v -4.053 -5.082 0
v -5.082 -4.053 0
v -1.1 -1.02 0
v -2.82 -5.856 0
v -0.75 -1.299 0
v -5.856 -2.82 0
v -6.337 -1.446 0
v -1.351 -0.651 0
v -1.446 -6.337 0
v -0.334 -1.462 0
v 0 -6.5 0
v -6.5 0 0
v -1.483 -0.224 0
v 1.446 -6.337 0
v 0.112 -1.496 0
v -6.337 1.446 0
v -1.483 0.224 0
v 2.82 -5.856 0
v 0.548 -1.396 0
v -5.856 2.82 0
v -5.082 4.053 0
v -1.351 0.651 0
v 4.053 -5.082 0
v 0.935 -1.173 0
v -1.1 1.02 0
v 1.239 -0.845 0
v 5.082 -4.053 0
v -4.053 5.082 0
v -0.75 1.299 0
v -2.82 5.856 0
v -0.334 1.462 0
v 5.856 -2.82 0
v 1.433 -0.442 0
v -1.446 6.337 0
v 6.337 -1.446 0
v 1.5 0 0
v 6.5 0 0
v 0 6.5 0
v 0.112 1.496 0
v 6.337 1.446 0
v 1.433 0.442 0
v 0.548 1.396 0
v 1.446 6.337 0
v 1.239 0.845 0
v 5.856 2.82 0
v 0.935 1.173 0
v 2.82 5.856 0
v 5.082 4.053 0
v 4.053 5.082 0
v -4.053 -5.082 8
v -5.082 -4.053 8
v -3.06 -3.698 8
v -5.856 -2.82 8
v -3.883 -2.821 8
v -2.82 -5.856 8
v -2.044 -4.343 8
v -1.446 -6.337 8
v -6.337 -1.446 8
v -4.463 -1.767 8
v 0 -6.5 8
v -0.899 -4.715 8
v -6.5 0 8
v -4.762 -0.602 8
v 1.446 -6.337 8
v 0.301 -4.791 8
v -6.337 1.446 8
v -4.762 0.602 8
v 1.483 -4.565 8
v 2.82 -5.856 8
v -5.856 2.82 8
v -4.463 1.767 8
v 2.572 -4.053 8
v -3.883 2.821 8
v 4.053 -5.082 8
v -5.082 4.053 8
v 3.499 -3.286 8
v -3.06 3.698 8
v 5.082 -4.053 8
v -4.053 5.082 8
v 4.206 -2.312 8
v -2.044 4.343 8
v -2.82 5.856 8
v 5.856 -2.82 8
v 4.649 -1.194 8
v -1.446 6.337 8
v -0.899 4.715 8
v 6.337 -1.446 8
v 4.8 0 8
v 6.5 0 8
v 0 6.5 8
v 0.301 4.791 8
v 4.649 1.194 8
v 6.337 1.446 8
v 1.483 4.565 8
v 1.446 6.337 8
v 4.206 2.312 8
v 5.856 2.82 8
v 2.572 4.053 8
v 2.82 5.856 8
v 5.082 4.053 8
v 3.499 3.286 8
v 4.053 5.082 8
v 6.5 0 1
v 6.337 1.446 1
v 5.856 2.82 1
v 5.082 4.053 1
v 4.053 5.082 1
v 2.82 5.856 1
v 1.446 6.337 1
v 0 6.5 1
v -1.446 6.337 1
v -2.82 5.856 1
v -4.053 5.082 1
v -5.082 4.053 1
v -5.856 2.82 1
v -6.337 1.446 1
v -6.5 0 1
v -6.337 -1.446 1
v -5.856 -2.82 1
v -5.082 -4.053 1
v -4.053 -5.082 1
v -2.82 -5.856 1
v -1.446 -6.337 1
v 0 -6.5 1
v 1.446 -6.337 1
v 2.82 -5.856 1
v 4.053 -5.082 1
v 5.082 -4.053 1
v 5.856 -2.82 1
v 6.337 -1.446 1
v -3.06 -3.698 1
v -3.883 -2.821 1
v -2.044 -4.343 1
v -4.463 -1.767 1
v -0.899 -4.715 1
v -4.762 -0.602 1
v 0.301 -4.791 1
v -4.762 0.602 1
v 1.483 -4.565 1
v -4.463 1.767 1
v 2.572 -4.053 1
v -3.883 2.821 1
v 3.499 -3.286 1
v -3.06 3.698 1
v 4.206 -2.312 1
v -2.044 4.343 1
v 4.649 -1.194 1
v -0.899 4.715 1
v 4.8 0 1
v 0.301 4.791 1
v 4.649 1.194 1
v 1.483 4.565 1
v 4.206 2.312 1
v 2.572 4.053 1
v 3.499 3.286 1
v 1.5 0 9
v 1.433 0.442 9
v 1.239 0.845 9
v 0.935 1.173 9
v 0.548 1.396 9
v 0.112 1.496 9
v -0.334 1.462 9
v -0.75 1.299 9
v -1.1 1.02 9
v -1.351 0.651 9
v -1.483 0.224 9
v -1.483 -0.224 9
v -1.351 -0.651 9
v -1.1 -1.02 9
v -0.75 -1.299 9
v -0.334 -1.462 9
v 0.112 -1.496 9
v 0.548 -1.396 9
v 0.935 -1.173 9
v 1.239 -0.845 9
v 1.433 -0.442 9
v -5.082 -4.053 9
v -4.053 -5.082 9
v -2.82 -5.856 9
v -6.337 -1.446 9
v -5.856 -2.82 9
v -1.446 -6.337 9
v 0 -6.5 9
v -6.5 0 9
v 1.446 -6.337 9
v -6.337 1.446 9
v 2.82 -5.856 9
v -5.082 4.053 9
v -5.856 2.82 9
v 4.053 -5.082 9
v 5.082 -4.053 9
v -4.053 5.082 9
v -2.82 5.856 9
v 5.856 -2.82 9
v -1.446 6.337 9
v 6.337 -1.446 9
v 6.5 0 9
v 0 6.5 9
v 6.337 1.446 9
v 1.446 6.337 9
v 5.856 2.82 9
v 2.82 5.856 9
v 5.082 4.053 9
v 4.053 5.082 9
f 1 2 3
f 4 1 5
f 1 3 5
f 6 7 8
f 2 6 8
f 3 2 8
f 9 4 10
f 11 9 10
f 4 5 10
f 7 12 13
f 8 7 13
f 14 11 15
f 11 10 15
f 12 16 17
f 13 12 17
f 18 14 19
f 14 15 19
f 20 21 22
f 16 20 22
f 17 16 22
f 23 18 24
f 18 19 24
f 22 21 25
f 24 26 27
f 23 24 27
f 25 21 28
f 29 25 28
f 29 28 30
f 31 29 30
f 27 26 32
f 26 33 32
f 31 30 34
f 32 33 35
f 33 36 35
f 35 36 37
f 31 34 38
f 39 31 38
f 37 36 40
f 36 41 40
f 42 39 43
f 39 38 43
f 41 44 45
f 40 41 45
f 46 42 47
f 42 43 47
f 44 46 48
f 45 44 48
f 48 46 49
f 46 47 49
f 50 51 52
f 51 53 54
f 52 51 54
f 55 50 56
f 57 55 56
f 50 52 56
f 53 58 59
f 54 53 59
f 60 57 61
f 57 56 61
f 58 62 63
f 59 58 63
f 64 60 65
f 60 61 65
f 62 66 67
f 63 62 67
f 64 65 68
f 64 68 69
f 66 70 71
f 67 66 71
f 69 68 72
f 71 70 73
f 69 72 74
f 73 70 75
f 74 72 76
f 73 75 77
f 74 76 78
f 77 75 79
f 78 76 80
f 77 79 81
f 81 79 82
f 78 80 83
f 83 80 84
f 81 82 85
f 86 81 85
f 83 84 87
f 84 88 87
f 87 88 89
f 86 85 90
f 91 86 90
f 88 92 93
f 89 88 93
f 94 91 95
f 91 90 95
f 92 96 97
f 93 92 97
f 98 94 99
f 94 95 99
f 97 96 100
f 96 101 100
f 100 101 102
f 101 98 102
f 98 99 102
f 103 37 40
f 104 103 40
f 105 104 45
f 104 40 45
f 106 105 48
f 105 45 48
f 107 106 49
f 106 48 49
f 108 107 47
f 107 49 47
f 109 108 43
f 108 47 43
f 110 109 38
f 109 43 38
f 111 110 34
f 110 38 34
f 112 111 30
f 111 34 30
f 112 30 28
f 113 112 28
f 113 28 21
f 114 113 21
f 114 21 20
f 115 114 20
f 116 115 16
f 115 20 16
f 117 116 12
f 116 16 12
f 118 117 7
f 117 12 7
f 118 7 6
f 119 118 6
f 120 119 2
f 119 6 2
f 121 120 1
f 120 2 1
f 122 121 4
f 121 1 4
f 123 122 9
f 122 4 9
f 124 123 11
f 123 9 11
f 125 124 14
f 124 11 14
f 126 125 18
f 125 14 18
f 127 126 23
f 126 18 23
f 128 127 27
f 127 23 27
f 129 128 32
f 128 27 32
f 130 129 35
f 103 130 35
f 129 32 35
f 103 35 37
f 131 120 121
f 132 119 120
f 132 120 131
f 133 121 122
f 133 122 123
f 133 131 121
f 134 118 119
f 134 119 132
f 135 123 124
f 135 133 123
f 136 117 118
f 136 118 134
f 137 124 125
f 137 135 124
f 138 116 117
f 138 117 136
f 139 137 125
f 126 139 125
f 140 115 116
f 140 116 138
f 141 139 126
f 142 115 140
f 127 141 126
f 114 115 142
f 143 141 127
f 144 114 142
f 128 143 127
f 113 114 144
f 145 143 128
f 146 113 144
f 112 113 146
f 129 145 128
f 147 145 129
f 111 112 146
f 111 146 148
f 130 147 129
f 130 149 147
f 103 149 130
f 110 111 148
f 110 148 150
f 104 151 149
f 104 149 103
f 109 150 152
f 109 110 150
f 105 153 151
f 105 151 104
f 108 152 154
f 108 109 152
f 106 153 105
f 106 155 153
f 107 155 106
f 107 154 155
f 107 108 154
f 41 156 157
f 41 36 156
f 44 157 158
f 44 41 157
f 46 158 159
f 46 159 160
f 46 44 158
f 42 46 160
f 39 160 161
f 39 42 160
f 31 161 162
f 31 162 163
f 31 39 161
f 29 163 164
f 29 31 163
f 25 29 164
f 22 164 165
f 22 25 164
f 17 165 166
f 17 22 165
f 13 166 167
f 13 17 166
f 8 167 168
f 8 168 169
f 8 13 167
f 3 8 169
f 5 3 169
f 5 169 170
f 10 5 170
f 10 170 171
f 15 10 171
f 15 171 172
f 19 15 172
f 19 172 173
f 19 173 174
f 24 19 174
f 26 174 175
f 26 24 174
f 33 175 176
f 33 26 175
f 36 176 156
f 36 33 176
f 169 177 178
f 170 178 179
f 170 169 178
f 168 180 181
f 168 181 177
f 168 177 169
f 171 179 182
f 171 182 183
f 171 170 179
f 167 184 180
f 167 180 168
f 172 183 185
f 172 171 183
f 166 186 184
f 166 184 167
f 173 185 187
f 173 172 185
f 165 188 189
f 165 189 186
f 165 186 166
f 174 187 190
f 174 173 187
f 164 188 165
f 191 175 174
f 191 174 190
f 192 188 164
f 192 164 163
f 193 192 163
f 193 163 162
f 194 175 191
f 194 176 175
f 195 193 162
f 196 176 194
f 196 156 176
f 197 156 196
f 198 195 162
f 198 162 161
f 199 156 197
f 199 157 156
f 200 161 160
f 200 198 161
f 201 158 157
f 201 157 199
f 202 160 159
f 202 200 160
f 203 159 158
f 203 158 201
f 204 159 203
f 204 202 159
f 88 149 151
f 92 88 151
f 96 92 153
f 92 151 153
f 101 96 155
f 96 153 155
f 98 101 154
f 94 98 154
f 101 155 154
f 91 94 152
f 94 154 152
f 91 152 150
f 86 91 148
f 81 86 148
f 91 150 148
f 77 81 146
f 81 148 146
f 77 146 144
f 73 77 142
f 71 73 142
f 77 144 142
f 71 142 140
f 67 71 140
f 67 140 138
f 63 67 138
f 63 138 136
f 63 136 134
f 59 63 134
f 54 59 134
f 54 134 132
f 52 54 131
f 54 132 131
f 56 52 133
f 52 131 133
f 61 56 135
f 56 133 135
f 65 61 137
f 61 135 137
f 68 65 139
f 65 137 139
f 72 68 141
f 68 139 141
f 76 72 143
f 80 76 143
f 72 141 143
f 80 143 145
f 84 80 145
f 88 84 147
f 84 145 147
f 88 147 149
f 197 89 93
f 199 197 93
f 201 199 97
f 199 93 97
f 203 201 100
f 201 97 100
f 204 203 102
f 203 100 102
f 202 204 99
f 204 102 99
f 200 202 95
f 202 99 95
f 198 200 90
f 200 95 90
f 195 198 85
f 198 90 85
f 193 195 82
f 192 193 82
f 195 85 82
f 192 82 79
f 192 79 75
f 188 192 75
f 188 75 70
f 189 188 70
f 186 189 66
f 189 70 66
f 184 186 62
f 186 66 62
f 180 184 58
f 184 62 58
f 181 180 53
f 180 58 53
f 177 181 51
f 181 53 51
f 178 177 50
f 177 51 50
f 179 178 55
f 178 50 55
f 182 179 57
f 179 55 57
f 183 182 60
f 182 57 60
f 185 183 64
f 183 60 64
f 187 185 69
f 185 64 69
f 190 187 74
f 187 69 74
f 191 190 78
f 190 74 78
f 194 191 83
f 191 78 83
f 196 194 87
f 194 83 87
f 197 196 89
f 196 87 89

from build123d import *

# Parameters (mm, degrees)
SKETCH1_R           = 6.5
SKETCH1_R_2         = 1.5
BOSS_EXTRUDE1_DEPTH = 1
SKETCH2_R           = 4.8
SKETCH2_R_2         = 1.5
BOSS_EXTRUDE2_DEPTH = 7
SKETCH3_R           = 6.5
SKETCH3_R_2         = 1.5
BOSS_EXTRUDE3_DEPTH = 1


with BuildPart() as part:
    # Sketch1 → Boss-Extrude1 (new body)
    with BuildSketch(Plane.XY):
        Circle(SKETCH1_R)
        Circle(SKETCH1_R_2, mode=Mode.SUBTRACT)
    extrude(amount=BOSS_EXTRUDE1_DEPTH)

    # Sketch2 → Boss-Extrude2 (add)
    with BuildSketch(Plane.XY.offset(1)):
        Circle(SKETCH2_R)
        Circle(SKETCH2_R_2, mode=Mode.SUBTRACT)
    extrude(amount=BOSS_EXTRUDE2_DEPTH)

    # Sketch3 → Boss-Extrude3 (add)
    with BuildSketch(Plane.XY.offset(8)):
        Circle(SKETCH3_R)
        Circle(SKETCH3_R_2, mode=Mode.SUBTRACT)
    extrude(amount=BOSS_EXTRUDE3_DEPTH)


solid = part.part
